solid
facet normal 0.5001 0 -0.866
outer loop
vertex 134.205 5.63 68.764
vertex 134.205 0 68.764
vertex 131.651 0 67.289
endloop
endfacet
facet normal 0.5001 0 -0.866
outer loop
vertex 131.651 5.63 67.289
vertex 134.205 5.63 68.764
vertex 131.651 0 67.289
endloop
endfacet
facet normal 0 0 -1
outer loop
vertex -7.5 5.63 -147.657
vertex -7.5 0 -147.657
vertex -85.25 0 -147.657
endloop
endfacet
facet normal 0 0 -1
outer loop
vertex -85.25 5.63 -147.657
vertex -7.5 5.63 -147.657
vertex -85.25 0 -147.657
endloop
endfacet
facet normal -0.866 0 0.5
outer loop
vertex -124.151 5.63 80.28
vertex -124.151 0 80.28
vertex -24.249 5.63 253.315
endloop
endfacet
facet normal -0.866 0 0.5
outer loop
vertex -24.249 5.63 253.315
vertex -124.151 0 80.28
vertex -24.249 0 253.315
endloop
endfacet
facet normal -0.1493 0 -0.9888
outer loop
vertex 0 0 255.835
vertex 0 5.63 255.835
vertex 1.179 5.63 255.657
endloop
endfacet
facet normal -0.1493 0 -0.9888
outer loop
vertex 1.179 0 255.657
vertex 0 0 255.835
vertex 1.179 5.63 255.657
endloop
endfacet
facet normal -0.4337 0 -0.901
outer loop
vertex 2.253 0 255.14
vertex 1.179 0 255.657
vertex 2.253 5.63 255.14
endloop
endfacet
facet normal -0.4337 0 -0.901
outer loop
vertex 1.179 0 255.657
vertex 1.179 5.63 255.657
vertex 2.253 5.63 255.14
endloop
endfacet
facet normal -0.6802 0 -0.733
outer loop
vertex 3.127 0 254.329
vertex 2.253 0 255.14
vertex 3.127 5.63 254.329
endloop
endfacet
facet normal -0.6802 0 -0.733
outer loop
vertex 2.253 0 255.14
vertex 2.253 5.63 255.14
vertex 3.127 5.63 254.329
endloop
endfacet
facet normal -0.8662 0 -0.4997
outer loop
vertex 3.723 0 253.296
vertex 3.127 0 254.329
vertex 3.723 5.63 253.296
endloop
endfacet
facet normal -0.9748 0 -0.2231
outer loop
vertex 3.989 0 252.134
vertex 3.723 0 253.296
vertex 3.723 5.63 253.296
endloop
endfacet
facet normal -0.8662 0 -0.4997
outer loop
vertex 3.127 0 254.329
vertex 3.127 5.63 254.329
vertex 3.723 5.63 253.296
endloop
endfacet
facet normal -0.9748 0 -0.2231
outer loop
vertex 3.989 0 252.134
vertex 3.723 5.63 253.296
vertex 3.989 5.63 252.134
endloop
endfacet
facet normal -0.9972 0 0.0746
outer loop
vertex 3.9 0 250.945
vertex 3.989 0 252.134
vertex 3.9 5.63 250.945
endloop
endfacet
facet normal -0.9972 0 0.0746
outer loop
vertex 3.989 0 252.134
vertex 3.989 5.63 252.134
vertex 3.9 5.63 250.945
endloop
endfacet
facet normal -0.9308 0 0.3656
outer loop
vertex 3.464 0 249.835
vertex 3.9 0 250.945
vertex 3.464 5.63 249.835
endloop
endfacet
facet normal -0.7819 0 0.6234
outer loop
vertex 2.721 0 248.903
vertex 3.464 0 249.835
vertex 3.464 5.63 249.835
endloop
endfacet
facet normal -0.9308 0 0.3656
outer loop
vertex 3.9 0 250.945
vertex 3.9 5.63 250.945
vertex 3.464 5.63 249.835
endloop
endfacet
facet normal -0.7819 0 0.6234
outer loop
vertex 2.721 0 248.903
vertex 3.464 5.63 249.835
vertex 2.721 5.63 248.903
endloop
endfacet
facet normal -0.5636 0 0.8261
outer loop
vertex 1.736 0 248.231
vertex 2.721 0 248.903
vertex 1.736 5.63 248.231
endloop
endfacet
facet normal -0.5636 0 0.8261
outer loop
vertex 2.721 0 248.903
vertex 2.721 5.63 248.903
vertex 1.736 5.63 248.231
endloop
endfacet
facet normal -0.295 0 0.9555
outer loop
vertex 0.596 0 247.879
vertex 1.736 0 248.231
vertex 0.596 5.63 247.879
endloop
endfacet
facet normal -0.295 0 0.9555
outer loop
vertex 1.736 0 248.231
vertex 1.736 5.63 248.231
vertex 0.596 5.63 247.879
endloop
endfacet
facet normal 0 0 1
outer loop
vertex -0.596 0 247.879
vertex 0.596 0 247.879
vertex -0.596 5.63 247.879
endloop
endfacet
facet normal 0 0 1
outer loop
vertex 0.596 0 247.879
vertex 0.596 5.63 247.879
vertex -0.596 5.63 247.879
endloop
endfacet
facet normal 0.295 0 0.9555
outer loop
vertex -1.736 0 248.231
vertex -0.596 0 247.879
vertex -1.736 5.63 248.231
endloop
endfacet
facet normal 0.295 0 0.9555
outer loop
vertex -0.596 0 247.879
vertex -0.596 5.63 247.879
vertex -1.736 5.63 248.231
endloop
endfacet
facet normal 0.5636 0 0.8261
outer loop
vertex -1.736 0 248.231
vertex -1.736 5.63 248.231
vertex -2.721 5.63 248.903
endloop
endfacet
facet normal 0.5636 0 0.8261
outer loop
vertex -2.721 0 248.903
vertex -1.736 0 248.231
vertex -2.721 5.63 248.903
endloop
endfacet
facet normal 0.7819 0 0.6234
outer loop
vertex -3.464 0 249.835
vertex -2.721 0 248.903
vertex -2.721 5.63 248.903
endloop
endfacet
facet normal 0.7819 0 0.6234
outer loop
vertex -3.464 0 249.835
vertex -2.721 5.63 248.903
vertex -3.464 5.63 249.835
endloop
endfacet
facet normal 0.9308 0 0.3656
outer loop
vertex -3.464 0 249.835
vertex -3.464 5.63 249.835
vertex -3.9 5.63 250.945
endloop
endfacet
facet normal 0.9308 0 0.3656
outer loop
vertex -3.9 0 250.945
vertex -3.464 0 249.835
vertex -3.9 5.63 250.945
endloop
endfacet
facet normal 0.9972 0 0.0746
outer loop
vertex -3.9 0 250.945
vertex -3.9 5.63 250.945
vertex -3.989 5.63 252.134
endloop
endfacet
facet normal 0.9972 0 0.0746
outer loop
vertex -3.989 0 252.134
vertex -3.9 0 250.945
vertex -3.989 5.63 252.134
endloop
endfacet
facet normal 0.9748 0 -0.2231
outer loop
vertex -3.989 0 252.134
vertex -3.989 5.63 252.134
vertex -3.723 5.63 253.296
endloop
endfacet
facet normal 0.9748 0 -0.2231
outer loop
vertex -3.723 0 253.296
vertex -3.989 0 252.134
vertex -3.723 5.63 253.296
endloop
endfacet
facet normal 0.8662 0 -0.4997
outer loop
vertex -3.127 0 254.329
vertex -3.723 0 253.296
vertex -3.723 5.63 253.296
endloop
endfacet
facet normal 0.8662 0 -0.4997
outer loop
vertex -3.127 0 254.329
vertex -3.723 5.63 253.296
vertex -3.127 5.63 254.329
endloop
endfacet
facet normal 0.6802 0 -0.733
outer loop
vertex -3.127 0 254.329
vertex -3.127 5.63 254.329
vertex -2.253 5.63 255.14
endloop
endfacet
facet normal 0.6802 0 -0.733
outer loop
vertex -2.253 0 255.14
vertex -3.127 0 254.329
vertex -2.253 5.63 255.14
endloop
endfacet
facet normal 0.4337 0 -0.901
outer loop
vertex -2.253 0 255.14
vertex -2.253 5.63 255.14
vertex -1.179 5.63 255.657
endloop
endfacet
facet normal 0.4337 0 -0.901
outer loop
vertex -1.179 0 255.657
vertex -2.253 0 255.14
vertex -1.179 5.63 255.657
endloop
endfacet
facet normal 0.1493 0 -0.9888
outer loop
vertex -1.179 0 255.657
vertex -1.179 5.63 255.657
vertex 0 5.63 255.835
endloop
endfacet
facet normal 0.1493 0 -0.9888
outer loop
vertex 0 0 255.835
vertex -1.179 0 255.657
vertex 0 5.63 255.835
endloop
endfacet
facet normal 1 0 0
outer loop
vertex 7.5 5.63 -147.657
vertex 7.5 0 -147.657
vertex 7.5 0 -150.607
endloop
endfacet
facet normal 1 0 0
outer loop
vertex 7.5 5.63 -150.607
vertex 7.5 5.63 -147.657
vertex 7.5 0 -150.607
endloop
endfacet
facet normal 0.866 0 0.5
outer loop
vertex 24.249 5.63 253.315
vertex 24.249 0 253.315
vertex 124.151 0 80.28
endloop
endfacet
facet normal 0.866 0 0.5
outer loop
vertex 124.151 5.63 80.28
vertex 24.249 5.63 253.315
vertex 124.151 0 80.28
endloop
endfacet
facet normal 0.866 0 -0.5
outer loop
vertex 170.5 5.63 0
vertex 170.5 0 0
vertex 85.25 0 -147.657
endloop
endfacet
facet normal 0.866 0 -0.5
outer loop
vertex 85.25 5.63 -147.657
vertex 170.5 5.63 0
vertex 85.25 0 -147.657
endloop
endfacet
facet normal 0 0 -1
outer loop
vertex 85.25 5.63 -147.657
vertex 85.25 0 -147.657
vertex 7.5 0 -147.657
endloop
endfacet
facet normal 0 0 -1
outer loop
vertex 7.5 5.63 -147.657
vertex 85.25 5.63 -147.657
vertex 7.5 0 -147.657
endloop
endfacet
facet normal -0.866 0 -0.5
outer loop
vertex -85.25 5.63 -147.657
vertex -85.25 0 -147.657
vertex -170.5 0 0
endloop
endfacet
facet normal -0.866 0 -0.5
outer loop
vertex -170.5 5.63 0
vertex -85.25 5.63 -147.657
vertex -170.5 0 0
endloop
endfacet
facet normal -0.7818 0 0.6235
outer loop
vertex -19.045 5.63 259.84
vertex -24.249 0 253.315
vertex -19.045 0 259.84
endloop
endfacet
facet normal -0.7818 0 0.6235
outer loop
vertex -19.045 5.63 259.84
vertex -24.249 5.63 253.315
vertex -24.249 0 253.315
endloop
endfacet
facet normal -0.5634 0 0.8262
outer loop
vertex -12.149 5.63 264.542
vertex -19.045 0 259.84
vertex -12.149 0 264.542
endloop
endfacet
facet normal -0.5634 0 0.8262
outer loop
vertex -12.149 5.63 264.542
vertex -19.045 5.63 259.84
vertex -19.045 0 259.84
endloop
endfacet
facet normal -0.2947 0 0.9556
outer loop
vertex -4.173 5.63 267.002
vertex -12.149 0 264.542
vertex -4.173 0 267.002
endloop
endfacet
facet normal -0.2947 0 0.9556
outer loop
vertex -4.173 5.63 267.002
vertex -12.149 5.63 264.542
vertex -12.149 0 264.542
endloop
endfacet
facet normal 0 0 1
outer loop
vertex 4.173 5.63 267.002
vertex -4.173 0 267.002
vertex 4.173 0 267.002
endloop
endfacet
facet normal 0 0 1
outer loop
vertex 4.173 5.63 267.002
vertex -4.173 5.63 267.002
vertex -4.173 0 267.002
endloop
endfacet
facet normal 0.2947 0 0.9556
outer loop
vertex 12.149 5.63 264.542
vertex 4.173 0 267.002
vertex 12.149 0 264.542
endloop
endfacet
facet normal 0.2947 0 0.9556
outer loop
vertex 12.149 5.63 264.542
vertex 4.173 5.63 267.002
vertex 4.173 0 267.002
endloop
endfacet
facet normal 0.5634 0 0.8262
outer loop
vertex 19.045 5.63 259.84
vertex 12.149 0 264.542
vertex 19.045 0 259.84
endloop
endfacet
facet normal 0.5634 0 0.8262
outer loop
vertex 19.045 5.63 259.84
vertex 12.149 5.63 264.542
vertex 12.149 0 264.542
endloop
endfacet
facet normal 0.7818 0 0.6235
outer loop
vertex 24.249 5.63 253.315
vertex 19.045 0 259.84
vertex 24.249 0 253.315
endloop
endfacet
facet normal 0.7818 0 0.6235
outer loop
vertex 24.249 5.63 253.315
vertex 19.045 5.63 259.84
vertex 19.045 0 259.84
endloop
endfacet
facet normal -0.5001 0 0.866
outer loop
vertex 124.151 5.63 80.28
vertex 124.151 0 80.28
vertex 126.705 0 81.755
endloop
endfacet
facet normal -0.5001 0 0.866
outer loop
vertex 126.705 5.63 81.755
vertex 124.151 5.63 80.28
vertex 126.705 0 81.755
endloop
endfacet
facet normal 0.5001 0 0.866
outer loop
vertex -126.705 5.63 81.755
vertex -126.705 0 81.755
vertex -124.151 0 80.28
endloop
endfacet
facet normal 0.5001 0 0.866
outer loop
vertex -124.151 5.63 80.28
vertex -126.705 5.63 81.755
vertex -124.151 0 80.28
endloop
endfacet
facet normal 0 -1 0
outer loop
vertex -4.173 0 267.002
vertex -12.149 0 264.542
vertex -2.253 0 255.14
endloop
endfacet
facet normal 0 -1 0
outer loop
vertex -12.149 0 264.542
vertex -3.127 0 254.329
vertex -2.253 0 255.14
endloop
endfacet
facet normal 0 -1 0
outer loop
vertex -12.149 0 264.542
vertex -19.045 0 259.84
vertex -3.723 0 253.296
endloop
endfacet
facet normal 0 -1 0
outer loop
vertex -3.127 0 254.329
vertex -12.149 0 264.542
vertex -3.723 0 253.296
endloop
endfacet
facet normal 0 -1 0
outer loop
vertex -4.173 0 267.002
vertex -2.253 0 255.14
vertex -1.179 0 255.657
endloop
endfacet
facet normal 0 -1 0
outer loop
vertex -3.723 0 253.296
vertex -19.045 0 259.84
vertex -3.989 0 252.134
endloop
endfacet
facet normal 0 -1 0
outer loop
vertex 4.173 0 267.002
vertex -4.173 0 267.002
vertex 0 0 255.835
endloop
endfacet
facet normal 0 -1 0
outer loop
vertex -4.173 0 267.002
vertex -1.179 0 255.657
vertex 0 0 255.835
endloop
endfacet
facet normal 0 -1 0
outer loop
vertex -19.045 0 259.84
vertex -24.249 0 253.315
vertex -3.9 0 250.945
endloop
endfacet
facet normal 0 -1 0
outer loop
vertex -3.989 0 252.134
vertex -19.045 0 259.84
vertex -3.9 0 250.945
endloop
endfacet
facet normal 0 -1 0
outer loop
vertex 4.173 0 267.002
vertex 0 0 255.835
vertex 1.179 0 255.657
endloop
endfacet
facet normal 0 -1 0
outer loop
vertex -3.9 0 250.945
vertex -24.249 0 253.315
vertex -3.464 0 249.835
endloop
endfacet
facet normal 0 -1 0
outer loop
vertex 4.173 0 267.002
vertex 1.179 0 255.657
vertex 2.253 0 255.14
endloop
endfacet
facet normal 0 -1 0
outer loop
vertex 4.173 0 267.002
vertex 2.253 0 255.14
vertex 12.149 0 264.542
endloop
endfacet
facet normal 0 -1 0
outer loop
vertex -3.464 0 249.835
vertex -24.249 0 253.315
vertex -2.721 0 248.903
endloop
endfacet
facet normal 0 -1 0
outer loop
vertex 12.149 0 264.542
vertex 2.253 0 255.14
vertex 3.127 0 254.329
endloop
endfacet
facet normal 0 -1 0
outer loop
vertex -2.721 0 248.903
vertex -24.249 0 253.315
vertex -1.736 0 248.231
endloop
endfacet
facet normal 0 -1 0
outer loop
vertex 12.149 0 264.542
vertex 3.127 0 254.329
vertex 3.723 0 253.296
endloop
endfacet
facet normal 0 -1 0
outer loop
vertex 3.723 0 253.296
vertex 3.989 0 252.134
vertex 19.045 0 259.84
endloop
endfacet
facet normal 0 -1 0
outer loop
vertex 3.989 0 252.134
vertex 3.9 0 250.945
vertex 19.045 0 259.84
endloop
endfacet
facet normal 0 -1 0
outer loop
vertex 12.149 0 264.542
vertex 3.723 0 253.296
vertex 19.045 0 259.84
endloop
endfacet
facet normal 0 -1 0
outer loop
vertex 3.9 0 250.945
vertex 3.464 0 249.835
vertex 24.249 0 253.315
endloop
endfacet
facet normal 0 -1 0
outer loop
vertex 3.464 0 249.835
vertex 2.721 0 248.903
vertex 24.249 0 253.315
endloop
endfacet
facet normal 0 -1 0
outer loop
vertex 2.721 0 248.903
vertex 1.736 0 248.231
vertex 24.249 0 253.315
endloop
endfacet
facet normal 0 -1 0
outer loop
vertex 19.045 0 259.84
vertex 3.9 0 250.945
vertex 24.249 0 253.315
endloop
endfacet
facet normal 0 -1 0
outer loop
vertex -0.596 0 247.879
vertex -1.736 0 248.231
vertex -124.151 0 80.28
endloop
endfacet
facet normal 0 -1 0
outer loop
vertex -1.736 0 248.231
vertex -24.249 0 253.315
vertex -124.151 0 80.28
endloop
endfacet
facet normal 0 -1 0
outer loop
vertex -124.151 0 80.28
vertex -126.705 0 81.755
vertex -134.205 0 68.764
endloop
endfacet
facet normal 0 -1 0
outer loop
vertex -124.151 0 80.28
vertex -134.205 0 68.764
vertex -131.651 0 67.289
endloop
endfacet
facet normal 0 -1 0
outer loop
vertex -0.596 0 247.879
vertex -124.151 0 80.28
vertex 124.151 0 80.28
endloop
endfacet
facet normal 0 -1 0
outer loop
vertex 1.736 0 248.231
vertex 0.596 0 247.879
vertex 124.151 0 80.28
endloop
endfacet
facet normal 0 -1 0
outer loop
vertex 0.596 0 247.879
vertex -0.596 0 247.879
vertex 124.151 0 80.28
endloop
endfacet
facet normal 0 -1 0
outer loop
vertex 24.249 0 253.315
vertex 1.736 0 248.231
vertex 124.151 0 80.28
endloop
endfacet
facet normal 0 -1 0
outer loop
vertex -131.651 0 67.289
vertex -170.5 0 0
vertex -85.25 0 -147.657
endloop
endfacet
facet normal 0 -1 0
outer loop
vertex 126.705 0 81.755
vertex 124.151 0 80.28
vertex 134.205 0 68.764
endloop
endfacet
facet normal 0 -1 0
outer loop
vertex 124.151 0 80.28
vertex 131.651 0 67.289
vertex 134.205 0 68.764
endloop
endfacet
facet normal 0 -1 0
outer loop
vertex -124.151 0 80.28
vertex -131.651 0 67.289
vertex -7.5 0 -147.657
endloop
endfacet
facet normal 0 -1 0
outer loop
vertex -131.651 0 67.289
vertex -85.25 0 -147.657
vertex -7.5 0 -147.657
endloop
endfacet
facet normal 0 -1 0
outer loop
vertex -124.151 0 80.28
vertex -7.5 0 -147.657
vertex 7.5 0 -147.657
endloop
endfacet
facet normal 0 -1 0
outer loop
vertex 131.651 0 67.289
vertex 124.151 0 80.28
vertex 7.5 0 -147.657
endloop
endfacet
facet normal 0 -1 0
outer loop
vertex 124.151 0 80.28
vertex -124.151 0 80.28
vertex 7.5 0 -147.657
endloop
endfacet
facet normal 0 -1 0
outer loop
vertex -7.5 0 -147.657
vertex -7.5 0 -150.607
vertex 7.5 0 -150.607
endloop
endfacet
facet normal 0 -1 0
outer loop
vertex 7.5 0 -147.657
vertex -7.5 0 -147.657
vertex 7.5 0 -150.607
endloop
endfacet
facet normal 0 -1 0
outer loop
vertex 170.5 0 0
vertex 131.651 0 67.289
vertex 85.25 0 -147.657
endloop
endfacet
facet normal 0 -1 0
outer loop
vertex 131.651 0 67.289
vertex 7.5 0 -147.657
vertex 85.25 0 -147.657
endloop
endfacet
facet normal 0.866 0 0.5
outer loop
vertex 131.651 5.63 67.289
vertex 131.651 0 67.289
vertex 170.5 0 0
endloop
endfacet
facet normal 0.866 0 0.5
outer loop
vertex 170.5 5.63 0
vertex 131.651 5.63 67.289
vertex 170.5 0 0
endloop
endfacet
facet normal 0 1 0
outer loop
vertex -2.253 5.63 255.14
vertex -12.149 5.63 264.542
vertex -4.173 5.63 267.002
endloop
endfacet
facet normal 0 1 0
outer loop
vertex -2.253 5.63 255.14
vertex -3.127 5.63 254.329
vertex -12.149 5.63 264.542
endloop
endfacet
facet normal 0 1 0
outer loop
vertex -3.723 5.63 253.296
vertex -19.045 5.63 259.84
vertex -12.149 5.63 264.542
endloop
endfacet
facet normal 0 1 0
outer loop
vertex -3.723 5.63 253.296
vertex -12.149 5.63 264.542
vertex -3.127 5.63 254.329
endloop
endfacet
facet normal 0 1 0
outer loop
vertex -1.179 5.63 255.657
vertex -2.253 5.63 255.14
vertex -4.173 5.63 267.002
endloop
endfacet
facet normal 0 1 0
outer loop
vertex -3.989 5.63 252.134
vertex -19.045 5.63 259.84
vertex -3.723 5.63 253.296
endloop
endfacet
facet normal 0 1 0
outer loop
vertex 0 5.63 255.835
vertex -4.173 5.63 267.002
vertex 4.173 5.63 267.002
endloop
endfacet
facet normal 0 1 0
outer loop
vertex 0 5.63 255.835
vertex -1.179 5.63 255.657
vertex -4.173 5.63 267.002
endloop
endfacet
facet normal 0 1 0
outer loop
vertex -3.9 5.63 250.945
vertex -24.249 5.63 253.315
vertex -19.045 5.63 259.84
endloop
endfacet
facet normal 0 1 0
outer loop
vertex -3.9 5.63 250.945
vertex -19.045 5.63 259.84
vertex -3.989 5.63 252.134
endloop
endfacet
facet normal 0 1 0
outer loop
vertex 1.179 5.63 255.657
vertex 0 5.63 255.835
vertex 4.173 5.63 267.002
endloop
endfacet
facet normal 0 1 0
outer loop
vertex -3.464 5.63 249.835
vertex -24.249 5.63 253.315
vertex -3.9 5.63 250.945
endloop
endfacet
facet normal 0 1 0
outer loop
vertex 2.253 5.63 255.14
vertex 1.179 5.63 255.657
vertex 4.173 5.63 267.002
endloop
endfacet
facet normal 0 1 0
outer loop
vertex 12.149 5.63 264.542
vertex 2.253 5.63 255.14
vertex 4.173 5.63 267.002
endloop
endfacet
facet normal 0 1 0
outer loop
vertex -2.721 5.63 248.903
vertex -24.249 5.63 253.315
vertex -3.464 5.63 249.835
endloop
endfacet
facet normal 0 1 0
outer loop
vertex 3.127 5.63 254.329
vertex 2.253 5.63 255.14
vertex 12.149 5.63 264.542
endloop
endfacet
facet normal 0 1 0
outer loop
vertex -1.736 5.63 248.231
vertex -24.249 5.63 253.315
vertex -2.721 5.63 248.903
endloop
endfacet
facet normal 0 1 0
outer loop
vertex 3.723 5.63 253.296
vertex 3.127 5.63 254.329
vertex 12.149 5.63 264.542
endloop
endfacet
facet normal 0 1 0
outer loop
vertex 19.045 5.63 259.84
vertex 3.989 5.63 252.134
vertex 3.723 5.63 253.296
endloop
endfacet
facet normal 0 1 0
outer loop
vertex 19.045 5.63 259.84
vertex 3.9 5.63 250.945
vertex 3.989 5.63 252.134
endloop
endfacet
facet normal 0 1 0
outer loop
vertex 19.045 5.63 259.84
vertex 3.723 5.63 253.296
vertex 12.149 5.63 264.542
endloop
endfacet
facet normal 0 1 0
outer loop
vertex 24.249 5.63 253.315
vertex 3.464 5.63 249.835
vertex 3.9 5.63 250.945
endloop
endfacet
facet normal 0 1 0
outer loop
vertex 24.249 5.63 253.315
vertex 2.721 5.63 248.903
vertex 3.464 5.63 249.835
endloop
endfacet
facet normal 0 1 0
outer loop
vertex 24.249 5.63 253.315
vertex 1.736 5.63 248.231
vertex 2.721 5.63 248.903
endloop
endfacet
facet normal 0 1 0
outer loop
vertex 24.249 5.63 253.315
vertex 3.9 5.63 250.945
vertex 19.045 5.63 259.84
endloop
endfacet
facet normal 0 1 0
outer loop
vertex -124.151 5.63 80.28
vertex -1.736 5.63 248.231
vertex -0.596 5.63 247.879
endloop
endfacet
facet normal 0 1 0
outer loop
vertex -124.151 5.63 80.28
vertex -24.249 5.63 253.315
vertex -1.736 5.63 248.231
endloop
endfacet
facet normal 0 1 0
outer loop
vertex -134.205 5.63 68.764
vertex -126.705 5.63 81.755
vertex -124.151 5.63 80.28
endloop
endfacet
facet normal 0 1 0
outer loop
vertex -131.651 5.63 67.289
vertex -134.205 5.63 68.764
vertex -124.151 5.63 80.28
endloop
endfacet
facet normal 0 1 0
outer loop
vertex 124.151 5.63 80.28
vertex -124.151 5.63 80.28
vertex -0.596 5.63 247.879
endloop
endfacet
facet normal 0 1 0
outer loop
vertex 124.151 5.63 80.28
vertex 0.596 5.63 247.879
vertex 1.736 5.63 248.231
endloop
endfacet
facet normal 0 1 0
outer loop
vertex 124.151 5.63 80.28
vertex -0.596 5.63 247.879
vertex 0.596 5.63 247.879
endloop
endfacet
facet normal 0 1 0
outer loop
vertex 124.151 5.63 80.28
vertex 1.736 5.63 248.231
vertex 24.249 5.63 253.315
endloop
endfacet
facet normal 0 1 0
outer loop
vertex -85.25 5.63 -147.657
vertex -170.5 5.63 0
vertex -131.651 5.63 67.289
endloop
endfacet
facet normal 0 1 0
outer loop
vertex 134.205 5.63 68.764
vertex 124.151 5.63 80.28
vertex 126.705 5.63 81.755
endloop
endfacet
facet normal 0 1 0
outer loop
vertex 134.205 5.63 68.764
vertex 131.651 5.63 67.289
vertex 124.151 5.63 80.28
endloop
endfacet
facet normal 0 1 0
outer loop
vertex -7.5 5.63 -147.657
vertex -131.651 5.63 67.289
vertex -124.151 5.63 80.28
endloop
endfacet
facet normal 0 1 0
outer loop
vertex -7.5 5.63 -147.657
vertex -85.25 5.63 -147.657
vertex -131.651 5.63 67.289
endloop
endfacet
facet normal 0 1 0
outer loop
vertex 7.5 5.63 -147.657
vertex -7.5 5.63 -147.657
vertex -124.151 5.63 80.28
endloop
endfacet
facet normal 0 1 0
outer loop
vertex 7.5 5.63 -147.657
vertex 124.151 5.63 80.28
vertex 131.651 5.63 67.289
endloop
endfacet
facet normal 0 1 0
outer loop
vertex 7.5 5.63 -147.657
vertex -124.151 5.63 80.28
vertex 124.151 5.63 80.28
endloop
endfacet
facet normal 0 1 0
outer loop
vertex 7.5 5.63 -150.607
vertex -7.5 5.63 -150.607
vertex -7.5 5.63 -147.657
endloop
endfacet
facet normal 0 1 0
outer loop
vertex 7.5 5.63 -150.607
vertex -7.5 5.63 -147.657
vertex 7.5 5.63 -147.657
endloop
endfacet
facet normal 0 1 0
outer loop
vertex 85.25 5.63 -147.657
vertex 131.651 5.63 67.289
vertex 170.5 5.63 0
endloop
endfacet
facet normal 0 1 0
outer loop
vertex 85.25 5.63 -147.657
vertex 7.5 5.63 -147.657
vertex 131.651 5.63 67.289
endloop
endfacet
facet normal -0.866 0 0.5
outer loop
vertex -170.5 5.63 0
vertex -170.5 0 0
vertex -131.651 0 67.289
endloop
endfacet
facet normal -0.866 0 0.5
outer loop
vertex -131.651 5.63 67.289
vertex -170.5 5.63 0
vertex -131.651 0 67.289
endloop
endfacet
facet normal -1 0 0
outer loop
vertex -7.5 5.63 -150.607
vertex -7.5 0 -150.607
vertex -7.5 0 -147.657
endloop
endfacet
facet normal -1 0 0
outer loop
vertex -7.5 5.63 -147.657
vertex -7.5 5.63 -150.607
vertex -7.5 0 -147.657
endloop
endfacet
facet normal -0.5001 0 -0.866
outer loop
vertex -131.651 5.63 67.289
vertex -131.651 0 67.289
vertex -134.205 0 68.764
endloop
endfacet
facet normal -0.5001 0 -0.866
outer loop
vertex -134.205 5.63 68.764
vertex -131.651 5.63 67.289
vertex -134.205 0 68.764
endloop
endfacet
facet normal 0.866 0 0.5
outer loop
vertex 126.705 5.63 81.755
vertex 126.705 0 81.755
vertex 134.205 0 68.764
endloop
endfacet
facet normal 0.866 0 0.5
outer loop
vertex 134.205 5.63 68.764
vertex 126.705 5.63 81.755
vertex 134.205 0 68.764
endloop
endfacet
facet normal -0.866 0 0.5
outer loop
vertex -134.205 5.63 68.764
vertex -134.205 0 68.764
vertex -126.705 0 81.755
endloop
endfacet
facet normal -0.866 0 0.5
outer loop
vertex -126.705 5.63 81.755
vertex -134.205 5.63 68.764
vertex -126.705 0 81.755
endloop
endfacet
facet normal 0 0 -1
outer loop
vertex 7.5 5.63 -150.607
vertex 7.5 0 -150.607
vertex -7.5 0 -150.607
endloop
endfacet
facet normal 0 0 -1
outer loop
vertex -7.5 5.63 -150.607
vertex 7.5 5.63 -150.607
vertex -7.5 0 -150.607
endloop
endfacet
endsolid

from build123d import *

# Parameters (mm, degrees)
BOSS_EXTRUDE1_DEPTH = 5.63
FILLET1_R           = 28
SKETCH2_R           = 4
CUT_EXTRUDE4_DEPTH  = 10


with BuildPart() as part:
    # Sketch1 → Boss-Extrude1 (new body)
    with BuildSketch(Plane(origin=(0, 0, 0), x_dir=(1, 0, 0), z_dir=(0, 1, 0))):
        Polygon((-7.5, 147.657331345), (-85.25, 147.657331345), (-170.5, 0), (-131.650528172, -67.289259053), (-134.205303113, -68.764259053), (-126.705303113, -81.75464011), (-124.150528172, -80.27964011), (-85.25, -147.657331345), (0, -295.31466269), (85.25, -147.657331345), (124.150528172, -80.27964011), (126.705303113, -81.75464011), (134.205303113, -68.764259053), (131.650528172, -67.289259053), (170.5, 0), (85.25, 147.657331345), (7.5, 147.657331345), (7.5, 150.607331345), (-7.5, 150.607331345), align=None)
    extrude(amount=BOSS_EXTRUDE1_DEPTH)

    # Fillet1
    fillet1_edges = [part.edges().sort_by_distance(p)[0] for p in [
        (0, 2.815, 295.31466269),
    ]]
    fillet(fillet1_edges, radius=FILLET1_R)

    # Sketch2 → Cut-Extrude4 (cut)
    with BuildSketch(Plane(origin=(0, 5.63, 0), x_dir=(1, 0, 0), z_dir=(0, 1, 0))):
        with Locations(Location((0, -251.834791554, 0), (0, 0, 270))):
            Circle(SKETCH2_R)
    extrude(amount=-CUT_EXTRUDE4_DEPTH, mode=Mode.SUBTRACT)


solid = part.part
